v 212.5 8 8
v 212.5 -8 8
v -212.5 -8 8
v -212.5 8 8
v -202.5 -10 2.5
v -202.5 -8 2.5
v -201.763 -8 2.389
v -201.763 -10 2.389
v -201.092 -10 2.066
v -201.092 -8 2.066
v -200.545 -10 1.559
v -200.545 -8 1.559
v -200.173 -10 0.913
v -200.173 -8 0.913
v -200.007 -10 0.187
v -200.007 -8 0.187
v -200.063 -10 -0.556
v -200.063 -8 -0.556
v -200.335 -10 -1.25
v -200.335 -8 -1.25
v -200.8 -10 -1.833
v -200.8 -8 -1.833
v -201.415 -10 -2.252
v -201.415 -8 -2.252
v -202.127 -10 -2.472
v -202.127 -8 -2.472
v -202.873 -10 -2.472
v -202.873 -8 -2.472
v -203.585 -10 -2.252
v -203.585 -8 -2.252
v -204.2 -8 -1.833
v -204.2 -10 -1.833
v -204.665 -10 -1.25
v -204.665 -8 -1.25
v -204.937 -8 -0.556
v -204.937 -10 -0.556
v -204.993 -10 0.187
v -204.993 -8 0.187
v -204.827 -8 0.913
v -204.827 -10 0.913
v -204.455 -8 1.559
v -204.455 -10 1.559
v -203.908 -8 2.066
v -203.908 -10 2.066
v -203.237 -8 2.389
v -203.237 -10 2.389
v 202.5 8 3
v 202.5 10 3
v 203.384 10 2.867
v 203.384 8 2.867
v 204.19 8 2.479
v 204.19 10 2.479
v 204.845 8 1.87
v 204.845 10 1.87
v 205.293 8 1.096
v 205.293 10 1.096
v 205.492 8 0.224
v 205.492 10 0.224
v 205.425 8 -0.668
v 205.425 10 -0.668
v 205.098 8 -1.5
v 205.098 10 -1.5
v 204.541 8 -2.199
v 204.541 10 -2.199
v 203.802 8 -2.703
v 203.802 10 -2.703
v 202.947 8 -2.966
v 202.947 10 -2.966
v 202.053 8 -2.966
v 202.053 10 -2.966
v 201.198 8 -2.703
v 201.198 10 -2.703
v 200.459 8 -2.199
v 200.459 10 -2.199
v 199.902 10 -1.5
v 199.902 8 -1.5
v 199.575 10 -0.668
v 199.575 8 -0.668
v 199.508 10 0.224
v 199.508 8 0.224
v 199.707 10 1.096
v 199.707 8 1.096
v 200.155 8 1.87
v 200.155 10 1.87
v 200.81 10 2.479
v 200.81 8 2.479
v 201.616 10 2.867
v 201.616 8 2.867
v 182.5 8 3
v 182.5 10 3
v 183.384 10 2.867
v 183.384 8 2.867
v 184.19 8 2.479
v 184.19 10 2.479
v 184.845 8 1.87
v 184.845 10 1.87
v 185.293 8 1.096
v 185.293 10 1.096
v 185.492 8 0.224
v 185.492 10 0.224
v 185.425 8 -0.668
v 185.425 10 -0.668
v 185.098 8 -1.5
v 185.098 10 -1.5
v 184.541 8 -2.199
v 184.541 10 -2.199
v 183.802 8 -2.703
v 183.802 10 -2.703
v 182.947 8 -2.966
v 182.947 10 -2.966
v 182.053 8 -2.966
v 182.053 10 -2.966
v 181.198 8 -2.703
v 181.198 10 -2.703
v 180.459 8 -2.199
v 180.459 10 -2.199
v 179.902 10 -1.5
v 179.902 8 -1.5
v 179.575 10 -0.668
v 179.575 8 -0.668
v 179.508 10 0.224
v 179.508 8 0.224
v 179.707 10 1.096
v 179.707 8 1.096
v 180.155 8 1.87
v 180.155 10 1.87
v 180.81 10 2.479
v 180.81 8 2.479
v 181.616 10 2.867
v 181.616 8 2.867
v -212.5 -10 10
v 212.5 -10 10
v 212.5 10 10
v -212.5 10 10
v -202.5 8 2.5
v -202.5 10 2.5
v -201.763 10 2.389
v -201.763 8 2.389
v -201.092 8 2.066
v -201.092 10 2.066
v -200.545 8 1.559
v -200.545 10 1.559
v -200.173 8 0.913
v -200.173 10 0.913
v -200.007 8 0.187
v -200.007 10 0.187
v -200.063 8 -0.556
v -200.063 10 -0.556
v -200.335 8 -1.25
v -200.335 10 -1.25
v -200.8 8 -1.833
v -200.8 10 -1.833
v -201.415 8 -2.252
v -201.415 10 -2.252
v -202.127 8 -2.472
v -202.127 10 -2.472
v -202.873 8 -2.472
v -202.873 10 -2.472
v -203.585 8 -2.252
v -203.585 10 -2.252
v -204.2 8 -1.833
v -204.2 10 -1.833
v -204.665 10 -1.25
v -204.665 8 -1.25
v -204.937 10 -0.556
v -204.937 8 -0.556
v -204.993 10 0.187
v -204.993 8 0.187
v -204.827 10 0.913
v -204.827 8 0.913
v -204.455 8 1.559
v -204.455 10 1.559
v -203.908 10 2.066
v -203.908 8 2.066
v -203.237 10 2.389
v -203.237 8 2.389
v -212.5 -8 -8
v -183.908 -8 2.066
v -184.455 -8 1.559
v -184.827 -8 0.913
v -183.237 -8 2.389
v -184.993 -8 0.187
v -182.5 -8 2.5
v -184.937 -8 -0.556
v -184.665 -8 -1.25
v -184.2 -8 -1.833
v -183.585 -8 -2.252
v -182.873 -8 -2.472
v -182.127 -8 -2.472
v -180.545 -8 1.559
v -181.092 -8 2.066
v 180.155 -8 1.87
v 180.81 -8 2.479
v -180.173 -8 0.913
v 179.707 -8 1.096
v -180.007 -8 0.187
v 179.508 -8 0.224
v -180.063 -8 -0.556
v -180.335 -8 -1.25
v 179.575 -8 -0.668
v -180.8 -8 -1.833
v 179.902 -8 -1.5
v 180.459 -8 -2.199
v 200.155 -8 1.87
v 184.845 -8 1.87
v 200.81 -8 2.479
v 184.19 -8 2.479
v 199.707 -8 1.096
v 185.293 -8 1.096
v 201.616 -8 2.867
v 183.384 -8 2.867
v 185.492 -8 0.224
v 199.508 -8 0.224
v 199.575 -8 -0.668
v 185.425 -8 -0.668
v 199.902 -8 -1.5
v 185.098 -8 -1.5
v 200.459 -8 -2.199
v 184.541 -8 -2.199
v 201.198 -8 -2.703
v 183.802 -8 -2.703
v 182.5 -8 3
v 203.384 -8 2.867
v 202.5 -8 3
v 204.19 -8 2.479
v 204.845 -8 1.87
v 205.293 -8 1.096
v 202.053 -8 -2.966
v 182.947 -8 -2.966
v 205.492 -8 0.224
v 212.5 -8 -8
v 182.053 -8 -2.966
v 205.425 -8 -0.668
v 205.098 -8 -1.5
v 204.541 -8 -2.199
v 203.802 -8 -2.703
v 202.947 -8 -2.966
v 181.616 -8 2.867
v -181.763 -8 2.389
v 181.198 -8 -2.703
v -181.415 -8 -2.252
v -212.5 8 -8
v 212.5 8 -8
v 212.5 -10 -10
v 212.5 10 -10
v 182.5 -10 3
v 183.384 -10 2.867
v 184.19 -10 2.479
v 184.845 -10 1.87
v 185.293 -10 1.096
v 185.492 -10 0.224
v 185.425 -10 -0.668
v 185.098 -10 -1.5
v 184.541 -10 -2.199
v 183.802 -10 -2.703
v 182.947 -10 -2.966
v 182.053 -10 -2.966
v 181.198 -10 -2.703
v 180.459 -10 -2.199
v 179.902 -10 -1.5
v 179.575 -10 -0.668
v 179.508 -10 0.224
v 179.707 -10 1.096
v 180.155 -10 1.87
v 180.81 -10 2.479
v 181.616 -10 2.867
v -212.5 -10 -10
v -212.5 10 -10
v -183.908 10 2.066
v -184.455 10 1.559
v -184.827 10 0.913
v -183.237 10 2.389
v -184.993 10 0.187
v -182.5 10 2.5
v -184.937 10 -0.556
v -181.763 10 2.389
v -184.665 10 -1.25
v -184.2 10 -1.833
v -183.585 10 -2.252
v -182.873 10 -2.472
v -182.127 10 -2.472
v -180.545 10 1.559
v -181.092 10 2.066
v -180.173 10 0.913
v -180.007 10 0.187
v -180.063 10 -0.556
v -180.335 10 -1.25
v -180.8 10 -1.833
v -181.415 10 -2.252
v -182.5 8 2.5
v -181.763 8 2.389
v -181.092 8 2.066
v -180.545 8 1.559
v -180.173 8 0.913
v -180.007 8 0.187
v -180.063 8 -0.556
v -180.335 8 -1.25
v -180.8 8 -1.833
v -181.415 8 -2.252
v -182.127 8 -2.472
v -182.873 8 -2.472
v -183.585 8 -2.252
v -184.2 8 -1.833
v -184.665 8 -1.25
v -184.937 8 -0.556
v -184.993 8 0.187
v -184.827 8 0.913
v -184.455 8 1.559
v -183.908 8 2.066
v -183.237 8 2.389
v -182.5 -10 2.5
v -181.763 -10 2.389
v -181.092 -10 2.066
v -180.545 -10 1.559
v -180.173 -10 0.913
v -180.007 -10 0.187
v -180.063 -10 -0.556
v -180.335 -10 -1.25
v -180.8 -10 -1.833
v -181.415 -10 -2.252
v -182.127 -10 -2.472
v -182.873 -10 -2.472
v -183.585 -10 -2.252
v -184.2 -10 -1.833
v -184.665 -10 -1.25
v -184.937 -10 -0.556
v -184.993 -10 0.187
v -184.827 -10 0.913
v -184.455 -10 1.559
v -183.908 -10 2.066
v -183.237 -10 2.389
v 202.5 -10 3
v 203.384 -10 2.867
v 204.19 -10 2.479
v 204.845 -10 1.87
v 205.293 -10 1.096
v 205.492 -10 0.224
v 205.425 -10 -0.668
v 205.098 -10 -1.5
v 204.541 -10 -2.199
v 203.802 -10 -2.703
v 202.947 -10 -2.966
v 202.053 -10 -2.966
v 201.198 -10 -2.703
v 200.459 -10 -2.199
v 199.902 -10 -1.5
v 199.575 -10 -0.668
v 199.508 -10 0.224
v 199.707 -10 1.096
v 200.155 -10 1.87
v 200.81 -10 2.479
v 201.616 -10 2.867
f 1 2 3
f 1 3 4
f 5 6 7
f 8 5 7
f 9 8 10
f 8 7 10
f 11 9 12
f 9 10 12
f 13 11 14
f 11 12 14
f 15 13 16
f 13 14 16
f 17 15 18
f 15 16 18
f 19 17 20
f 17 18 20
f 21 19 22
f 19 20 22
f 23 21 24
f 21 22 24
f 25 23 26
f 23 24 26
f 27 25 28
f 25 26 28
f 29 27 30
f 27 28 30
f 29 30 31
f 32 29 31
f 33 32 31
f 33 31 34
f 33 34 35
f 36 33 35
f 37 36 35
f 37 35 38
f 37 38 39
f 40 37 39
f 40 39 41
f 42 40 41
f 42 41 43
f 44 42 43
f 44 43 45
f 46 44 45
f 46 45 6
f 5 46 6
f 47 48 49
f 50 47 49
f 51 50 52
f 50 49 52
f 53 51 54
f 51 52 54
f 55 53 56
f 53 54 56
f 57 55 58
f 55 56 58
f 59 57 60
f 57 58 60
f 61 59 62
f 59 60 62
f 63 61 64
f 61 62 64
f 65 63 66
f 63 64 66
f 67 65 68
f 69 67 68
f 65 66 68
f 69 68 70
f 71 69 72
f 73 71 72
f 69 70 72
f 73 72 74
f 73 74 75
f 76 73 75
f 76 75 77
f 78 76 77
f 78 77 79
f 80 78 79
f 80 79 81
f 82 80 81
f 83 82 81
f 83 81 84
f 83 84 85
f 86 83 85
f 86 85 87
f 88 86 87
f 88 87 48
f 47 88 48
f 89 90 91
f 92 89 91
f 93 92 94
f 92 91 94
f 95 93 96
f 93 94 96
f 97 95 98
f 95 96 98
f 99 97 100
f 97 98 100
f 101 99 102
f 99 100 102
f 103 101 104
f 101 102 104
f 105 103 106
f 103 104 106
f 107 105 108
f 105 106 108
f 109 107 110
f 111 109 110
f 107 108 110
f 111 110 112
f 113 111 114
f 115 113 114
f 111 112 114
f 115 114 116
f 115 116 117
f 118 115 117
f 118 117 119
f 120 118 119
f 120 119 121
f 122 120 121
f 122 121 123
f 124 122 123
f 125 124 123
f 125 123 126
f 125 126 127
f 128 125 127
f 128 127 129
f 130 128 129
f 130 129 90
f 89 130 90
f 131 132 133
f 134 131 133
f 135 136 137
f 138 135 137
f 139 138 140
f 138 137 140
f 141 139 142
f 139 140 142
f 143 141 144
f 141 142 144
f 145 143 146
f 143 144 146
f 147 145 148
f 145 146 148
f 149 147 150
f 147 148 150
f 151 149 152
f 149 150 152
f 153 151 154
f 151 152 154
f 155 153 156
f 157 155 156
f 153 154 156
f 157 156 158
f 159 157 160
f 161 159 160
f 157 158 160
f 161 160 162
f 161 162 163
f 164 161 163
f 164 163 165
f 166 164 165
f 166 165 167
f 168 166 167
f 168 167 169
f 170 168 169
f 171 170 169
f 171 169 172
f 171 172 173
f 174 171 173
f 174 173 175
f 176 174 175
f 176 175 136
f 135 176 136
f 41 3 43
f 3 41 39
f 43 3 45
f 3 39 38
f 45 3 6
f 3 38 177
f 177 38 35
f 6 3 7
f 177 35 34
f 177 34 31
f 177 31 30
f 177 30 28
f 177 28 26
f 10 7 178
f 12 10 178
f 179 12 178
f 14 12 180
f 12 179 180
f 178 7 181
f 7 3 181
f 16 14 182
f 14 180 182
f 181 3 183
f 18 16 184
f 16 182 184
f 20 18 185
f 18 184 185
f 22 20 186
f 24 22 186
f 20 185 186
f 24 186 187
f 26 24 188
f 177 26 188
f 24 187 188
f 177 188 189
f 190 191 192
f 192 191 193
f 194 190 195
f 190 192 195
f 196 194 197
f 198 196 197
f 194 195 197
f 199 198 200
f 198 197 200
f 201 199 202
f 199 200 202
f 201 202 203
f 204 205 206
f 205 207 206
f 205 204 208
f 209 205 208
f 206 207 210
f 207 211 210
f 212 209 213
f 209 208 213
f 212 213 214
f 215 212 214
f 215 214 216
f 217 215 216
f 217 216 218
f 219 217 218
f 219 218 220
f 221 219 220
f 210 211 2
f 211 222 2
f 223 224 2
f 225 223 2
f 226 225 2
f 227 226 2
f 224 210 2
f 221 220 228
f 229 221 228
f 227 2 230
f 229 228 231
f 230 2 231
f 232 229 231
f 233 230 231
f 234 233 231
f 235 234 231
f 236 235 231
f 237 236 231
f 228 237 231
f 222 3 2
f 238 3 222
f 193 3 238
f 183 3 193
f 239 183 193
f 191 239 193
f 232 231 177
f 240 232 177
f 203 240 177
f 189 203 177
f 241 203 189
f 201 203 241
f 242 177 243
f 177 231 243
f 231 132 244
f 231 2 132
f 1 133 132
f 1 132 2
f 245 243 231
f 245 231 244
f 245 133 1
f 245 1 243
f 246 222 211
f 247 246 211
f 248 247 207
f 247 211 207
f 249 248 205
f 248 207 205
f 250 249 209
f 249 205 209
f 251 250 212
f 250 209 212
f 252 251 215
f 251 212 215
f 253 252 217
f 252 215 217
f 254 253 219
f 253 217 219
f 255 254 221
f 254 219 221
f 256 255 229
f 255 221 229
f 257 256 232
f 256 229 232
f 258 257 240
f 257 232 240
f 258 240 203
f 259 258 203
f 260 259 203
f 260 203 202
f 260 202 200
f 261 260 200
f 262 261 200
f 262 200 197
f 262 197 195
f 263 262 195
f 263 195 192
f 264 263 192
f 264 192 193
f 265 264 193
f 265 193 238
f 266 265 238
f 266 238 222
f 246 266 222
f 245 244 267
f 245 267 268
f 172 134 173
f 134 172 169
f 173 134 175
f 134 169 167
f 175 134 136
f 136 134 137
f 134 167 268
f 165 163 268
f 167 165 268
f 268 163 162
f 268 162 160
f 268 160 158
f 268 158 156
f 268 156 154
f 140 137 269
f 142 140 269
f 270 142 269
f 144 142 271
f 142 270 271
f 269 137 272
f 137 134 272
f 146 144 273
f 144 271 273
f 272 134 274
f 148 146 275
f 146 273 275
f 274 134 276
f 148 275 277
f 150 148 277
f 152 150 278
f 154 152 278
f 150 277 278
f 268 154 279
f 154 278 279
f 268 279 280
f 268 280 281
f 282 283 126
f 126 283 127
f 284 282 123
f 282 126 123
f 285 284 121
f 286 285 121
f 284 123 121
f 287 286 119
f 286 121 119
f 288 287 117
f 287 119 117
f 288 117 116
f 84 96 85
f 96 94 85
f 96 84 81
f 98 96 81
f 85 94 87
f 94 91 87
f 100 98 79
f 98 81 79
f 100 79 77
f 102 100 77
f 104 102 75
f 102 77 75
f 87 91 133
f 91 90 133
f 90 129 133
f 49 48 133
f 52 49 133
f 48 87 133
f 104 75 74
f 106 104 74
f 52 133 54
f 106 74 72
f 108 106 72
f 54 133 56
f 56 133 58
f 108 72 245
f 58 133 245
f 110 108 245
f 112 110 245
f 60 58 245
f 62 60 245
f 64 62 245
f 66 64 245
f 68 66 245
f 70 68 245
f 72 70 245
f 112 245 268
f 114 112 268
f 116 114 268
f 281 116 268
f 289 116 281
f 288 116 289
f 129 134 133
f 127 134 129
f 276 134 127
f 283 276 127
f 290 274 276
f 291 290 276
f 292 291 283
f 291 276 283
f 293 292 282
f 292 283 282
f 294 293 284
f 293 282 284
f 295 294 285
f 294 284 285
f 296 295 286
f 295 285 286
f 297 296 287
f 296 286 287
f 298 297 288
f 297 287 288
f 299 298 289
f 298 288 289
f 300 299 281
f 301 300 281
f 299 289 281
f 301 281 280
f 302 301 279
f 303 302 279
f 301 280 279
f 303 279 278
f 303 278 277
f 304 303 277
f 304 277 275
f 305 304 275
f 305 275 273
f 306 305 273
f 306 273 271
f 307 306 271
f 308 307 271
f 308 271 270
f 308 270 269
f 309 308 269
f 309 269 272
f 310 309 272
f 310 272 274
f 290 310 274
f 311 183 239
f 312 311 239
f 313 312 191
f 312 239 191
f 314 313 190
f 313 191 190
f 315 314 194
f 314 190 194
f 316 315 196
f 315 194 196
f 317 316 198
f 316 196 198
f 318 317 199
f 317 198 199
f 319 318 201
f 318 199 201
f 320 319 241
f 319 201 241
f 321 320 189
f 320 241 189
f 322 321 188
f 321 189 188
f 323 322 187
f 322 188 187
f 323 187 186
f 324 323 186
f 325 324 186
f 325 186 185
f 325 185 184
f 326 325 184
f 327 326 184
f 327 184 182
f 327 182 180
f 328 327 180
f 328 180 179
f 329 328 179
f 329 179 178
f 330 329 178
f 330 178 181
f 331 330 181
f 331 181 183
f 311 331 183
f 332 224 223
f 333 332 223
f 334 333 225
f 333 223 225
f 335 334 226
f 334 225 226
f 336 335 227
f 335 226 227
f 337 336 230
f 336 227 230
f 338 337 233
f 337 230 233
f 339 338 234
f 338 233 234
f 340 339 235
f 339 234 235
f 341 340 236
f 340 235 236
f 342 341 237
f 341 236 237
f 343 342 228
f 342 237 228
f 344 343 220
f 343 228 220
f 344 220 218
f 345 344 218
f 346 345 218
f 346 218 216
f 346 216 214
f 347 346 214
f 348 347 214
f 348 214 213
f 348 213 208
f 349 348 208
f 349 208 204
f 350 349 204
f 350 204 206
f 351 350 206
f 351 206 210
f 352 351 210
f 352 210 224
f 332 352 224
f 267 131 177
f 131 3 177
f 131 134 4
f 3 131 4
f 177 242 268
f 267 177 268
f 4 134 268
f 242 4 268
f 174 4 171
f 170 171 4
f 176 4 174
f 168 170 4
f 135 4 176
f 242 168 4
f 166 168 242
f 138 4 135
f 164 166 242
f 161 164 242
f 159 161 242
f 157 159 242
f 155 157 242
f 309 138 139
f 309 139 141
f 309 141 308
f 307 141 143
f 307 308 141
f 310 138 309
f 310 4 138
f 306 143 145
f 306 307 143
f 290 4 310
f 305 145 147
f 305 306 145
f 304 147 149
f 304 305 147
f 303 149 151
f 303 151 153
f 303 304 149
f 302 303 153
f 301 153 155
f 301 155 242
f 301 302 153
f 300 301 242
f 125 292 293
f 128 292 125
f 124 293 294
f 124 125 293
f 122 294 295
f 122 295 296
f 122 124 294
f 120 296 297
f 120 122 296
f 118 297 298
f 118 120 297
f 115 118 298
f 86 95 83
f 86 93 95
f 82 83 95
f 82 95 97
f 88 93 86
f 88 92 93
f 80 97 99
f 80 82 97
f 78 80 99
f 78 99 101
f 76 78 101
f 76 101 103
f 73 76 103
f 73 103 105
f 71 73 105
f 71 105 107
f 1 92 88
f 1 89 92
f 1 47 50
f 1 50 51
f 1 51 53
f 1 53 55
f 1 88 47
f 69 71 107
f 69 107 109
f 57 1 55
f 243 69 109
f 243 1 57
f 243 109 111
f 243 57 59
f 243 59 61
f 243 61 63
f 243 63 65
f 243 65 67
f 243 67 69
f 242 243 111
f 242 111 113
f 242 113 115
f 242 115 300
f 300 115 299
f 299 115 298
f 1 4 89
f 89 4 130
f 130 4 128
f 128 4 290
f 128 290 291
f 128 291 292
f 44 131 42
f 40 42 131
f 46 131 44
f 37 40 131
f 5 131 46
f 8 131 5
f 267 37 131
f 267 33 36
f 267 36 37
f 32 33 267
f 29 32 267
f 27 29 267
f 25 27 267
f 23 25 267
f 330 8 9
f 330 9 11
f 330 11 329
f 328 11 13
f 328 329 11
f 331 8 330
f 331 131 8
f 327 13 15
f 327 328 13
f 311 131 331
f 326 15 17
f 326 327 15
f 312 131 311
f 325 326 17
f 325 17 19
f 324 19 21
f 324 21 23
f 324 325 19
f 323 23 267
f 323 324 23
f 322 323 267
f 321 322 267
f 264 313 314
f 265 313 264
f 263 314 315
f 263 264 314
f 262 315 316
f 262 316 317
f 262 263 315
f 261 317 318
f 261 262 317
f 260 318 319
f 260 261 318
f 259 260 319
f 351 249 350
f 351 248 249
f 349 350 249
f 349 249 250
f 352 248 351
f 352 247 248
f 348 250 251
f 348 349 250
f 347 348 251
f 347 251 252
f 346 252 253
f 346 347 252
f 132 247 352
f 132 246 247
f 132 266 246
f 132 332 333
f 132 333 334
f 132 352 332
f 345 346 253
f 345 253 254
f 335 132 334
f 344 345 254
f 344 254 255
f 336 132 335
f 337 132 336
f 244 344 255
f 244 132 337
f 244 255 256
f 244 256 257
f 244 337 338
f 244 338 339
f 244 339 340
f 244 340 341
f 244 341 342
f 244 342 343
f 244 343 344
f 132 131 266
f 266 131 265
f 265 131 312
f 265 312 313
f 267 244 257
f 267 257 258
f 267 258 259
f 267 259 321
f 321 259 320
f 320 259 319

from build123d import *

# Parameters (mm, degrees)
SKETCH1_W           = 20
SKETCH1_H           = 20
SKETCH1_W_2         = 16
SKETCH1_H_2         = 16
BOSS_EXTRUDE1_DEPTH = 212.5
SKETCH2_R           = 3
CUT_EXTRUDE1_DEPTH  = 214.673231828
SKETCH3_R           = 2.5
CUT_EXTRUDE2_DEPTH  = 214.673231828


with BuildPart() as part:
    # Sketch1 → Boss-Extrude1 (new, symmetric)
    with BuildSketch(Plane(origin=(0, 0, 0), x_dir=(0, 0, -1), z_dir=(1, 0, 0))):
        Rectangle(SKETCH1_W, SKETCH1_H)
        Rectangle(SKETCH1_W_2, SKETCH1_H_2, mode=Mode.SUBTRACT)
    extrude(amount=BOSS_EXTRUDE1_DEPTH, both=True)

    # Sketch2 → Cut-Extrude1 (cut, through all)
    with BuildSketch(Plane(origin=(0, 10, 0), x_dir=(1, 0, 0), z_dir=(0, 1, 0))):
        with Locations(Location((182.5, 0, 0), (0, 0, 270))):
            Circle(SKETCH2_R)
        with Locations(Location((202.5, 0, 0), (0, 0, 270))):
            Circle(SKETCH2_R)
    extrude(amount=-CUT_EXTRUDE1_DEPTH, mode=Mode.SUBTRACT)

    # Sketch3 → Cut-Extrude2 (cut, through all)
    with BuildSketch(Plane(origin=(0, 10, 0), x_dir=(1, 0, 0), z_dir=(0, 1, 0))):
        with Locations(Location((-202.5, 0, 0), (0, 0, 270))):
            Circle(SKETCH3_R)
        with Locations(Location((-182.5, 0, 0), (0, 0, 270))):
            Circle(SKETCH3_R)
    extrude(amount=-CUT_EXTRUDE2_DEPTH, mode=Mode.SUBTRACT)


solid = part.part
